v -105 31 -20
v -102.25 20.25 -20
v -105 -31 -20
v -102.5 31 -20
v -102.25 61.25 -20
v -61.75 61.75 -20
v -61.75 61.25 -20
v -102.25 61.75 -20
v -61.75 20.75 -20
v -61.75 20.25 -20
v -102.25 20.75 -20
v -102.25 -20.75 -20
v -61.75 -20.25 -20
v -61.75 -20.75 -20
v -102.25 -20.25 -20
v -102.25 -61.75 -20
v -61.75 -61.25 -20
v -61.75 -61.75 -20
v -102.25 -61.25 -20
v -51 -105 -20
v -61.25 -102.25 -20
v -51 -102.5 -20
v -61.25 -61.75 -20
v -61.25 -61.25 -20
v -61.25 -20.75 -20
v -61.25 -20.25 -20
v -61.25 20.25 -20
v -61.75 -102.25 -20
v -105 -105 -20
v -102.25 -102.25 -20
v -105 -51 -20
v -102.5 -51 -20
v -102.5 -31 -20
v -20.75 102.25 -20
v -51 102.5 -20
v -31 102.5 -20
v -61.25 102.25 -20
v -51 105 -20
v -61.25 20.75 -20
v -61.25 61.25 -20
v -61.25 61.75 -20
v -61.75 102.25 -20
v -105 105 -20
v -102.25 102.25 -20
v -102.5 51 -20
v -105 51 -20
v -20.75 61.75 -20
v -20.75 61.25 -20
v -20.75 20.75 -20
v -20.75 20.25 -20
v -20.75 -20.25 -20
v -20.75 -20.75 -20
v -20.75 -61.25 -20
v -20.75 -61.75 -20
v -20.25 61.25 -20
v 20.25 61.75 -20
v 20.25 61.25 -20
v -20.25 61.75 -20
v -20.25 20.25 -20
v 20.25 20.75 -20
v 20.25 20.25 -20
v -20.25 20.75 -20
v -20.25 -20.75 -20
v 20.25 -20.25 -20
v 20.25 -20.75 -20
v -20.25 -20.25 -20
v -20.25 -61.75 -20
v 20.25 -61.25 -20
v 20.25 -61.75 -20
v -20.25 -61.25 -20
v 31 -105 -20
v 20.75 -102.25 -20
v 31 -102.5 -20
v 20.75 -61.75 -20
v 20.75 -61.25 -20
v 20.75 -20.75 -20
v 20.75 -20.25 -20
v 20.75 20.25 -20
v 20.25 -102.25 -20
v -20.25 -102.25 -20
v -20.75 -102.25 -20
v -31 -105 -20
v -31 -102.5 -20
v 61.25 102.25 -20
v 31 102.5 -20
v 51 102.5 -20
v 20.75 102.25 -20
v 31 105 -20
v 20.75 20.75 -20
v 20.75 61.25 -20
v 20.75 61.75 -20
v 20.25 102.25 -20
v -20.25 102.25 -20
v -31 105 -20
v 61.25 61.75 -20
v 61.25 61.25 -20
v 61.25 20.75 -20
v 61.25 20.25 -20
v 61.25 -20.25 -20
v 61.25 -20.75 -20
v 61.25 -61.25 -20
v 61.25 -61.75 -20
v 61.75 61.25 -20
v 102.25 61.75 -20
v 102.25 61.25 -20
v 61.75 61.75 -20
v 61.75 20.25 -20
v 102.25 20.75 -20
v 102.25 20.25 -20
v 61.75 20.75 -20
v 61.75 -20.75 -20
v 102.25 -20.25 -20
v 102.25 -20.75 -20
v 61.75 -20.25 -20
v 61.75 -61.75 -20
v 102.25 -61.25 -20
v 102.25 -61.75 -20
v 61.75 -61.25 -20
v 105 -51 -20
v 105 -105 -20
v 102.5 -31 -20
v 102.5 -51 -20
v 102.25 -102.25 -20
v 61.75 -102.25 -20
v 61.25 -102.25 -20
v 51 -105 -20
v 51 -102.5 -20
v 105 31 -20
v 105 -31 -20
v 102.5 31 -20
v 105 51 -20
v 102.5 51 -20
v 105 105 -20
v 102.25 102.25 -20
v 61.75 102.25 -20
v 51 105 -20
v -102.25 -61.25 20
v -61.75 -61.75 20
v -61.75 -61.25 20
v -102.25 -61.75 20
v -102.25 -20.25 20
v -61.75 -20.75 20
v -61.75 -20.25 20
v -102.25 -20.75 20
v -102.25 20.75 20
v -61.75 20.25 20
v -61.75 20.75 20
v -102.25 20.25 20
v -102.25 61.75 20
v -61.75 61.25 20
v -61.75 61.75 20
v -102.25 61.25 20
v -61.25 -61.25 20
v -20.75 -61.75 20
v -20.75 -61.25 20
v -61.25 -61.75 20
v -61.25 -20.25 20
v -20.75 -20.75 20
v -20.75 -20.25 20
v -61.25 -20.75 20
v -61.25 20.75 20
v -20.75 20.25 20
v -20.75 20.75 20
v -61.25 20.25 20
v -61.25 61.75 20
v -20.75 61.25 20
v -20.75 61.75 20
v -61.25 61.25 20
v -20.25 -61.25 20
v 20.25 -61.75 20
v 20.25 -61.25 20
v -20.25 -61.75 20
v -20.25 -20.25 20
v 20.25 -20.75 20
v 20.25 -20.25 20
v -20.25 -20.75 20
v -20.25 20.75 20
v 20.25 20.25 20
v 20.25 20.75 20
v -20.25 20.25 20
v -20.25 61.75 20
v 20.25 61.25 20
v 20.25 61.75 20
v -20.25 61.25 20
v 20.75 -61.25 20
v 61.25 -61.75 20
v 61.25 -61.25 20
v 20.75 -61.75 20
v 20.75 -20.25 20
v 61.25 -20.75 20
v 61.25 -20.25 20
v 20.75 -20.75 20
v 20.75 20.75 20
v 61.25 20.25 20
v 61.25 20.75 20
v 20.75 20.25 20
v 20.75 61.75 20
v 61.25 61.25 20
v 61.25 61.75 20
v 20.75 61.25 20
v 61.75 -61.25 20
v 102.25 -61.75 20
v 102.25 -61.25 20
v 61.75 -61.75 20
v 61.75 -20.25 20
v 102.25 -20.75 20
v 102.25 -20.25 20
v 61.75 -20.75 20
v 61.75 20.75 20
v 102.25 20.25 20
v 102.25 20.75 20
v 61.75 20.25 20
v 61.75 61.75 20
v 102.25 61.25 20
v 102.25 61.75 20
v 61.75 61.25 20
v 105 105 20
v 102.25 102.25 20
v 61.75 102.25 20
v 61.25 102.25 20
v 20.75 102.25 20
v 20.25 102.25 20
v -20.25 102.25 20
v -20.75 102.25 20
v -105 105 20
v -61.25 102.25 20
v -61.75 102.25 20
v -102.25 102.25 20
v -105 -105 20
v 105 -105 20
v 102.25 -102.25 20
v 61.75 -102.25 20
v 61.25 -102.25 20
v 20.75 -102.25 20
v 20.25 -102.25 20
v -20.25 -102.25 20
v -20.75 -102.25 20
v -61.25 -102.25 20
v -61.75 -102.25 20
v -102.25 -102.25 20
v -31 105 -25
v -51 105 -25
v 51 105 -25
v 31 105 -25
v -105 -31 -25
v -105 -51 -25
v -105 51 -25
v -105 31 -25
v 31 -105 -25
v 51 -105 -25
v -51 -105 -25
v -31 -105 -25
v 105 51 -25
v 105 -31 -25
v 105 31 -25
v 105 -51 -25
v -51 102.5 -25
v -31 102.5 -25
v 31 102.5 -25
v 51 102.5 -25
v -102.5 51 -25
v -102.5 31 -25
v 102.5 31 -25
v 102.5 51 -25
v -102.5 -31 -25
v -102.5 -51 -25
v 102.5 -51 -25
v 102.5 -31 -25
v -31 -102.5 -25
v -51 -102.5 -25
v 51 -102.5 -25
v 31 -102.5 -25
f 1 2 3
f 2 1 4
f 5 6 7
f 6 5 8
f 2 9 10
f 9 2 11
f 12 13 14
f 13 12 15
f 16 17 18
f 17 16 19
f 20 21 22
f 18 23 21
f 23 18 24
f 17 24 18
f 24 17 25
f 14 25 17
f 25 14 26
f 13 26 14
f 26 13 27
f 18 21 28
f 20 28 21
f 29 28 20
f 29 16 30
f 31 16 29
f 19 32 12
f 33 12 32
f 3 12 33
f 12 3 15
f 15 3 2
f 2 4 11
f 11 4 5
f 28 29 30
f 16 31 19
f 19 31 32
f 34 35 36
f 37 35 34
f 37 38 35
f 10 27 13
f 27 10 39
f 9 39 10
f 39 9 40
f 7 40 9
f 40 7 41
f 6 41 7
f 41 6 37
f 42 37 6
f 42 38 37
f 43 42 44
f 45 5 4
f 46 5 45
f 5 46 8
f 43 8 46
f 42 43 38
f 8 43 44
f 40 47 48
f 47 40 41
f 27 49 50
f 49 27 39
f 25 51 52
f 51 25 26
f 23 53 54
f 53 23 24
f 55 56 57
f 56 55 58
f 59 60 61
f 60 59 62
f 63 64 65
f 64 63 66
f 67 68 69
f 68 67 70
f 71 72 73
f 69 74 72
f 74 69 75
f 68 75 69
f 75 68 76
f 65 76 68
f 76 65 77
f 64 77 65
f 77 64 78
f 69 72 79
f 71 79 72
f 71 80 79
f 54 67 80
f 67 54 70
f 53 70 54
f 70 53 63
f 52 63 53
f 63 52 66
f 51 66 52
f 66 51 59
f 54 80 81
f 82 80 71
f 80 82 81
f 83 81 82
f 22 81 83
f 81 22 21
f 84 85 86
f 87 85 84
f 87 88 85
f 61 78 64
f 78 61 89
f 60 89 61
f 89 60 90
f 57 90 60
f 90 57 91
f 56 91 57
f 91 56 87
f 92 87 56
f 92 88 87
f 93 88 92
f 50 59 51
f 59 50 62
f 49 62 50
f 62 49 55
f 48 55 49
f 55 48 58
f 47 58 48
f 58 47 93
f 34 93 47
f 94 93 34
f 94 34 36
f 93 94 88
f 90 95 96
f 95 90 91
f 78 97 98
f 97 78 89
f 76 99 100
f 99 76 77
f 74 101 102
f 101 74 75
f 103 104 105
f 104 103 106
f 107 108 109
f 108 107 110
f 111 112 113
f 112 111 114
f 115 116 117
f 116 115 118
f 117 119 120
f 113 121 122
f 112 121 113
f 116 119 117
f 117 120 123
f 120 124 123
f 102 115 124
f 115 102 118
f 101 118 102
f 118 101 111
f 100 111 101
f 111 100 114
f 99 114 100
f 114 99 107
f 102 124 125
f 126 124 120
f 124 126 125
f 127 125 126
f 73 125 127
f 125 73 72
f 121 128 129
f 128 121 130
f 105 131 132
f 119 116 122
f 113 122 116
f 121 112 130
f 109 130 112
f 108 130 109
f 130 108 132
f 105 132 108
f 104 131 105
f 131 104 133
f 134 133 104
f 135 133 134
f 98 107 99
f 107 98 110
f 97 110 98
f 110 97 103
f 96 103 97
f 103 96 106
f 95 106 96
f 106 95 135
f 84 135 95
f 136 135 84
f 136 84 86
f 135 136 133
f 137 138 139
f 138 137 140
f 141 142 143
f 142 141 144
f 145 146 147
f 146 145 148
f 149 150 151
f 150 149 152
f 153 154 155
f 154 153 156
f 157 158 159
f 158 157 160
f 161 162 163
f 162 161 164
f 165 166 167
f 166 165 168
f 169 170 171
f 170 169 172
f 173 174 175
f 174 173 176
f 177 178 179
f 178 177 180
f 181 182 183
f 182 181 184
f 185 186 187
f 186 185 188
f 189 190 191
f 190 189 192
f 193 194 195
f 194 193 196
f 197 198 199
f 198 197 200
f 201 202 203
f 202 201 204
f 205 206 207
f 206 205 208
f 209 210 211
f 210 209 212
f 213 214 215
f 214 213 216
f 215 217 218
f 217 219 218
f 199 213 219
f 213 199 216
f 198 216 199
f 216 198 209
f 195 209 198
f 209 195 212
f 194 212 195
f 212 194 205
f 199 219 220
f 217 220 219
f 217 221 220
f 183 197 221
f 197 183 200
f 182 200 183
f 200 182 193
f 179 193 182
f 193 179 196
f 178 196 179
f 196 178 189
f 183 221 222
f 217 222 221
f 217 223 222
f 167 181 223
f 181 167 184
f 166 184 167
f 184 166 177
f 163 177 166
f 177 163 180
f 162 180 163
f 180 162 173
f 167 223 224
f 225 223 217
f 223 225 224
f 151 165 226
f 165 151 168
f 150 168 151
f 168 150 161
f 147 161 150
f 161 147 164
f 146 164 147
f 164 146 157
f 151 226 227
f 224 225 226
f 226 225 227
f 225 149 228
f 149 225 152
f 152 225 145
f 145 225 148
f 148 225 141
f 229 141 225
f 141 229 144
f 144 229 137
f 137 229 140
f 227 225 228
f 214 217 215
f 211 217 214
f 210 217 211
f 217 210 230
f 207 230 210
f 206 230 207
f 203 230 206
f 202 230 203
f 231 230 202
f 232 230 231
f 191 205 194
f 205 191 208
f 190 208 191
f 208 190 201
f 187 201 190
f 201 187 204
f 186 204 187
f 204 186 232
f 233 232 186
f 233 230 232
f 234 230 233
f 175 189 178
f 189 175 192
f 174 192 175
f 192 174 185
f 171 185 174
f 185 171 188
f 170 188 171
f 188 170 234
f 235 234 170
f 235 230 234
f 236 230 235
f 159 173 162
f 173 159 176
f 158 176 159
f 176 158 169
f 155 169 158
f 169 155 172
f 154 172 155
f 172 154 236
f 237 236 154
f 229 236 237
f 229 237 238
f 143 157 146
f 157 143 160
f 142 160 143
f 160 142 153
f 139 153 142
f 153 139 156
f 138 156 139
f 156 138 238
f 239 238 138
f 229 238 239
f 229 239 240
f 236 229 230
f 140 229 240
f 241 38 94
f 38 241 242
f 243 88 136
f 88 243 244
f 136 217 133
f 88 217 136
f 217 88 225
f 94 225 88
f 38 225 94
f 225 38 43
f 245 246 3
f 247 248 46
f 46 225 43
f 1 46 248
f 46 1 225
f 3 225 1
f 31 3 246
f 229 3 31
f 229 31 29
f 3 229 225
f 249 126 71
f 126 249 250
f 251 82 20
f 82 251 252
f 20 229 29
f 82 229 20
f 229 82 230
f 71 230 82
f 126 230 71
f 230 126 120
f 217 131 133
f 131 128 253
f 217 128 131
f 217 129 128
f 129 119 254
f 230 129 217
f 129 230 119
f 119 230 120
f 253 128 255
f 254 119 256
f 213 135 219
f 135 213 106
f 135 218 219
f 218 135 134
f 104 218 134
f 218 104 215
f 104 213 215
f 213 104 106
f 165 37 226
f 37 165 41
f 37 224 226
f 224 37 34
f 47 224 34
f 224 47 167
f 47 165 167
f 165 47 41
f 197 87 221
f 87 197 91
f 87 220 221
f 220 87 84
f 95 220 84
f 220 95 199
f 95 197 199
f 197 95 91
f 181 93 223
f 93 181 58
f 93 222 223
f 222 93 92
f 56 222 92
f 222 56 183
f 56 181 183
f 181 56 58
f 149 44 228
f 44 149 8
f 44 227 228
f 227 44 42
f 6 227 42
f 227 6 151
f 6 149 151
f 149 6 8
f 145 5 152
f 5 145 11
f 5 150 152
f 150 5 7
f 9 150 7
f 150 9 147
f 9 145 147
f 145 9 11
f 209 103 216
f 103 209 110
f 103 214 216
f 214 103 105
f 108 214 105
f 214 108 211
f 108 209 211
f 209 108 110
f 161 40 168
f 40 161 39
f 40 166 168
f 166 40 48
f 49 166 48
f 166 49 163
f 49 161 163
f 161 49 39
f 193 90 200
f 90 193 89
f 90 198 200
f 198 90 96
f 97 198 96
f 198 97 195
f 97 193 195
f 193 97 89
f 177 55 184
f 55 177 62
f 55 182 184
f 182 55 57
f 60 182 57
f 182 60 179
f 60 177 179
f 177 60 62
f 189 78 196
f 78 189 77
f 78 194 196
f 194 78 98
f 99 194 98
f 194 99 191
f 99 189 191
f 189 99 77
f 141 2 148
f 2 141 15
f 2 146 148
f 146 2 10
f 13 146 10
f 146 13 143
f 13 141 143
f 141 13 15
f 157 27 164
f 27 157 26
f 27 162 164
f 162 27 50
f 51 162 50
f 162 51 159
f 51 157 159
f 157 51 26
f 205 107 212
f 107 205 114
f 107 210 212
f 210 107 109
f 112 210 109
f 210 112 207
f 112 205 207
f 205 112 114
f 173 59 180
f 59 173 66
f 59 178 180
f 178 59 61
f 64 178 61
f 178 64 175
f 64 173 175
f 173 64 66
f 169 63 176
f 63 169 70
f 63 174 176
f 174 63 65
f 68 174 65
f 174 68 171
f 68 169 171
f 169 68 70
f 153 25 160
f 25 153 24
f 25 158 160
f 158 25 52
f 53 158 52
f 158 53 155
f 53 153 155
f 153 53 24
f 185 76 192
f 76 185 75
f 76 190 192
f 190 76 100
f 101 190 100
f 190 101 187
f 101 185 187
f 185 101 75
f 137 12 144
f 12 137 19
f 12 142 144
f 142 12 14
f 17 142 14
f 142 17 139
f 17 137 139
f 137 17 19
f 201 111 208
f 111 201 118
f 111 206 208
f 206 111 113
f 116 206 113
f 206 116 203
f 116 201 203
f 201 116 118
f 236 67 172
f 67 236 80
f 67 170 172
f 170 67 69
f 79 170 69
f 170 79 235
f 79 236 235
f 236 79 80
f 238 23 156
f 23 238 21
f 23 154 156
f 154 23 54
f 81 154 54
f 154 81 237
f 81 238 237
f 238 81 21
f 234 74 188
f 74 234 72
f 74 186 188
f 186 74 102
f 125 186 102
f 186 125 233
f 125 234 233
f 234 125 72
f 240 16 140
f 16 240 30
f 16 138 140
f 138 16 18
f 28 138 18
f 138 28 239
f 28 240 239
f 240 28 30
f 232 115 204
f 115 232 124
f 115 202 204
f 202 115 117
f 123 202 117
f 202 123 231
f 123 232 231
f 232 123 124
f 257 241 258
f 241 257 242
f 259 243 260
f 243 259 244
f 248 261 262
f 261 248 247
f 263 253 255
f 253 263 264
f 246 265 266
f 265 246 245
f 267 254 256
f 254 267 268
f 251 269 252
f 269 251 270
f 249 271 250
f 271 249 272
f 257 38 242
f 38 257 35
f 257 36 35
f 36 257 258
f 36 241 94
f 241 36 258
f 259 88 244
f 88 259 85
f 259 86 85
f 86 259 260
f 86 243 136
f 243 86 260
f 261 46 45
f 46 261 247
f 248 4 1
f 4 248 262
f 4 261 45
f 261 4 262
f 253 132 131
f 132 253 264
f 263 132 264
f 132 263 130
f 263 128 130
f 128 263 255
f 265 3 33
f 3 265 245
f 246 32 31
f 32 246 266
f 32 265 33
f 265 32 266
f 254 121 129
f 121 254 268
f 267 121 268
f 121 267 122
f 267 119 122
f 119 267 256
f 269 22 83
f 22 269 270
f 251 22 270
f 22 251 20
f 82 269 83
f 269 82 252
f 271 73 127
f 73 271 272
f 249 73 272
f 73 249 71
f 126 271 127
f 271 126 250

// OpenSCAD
n_rows = 5;
n_cols = 5;

PCB_size = 205;
frame_extra_size = 5;

ball_size = 40;
ball_distance = 41;
inner_wall_width = 0.5;

mouting_tab_height = 5;

frame_size_x = n_cols * ball_distance + frame_extra_size;
frame_size_y = n_rows * ball_distance + frame_extra_size;

ball_hole_size = ball_distance - inner_wall_width;

centering_ball_offset_col = (ball_distance * (n_cols - 1)) / 2;

centering_ball_offset_row = (ball_distance * (n_rows - 1)) / 2;
union(){
    // Main grid
    color("red",1)
    linear_extrude(height = 40,center = true,convexity = false,twist = false ,slices = false)
    difference(){

        
        square([frame_size_x,frame_size_y],center = true);


        for (col = [ 0 : n_cols - 1 ]) {
            for(row = [ 0 : n_rows - 1 ]) {
                translate([col * ball_distance - centering_ball_offset_col, row * ball_distance - centering_ball_offset_row, 0]) 
                square([ball_hole_size, ball_hole_size],center = true);
            }
        }
    }

    tab_length = 20;
    tab_width_x = (frame_size_x-PCB_size) / 2;
    tab_width_y = (frame_size_y-PCB_size) / 2;

echo (frame_size_x);
echo (PCB_size);    

    // mounting tabs
    translate([0,0, - 20 - mouting_tab_height / 2])
    linear_extrude(height = mouting_tab_height,center = true,convexity = false,twist = false ,slices = false)
    for(i = [0:1]){
        for(j = [0:1]) {
           
            translate([
            i * (n_cols / 2.5) * (ball_distance) - ball_distance,
            j * (frame_size_y - tab_width_y) + tab_width_y/2 - (frame_size_y / 2) , 
            0])
            square([tab_length, tab_width_y],center = true);
            
            translate([
            i * (frame_size_x - tab_width_x) + tab_width_x/2 - (frame_size_y / 2), 
            j * (n_rows / 2.5) * (ball_distance) - ball_distance, 
            0])
            square([tab_width_x, tab_length],center = true);
            
        }
    }
}
